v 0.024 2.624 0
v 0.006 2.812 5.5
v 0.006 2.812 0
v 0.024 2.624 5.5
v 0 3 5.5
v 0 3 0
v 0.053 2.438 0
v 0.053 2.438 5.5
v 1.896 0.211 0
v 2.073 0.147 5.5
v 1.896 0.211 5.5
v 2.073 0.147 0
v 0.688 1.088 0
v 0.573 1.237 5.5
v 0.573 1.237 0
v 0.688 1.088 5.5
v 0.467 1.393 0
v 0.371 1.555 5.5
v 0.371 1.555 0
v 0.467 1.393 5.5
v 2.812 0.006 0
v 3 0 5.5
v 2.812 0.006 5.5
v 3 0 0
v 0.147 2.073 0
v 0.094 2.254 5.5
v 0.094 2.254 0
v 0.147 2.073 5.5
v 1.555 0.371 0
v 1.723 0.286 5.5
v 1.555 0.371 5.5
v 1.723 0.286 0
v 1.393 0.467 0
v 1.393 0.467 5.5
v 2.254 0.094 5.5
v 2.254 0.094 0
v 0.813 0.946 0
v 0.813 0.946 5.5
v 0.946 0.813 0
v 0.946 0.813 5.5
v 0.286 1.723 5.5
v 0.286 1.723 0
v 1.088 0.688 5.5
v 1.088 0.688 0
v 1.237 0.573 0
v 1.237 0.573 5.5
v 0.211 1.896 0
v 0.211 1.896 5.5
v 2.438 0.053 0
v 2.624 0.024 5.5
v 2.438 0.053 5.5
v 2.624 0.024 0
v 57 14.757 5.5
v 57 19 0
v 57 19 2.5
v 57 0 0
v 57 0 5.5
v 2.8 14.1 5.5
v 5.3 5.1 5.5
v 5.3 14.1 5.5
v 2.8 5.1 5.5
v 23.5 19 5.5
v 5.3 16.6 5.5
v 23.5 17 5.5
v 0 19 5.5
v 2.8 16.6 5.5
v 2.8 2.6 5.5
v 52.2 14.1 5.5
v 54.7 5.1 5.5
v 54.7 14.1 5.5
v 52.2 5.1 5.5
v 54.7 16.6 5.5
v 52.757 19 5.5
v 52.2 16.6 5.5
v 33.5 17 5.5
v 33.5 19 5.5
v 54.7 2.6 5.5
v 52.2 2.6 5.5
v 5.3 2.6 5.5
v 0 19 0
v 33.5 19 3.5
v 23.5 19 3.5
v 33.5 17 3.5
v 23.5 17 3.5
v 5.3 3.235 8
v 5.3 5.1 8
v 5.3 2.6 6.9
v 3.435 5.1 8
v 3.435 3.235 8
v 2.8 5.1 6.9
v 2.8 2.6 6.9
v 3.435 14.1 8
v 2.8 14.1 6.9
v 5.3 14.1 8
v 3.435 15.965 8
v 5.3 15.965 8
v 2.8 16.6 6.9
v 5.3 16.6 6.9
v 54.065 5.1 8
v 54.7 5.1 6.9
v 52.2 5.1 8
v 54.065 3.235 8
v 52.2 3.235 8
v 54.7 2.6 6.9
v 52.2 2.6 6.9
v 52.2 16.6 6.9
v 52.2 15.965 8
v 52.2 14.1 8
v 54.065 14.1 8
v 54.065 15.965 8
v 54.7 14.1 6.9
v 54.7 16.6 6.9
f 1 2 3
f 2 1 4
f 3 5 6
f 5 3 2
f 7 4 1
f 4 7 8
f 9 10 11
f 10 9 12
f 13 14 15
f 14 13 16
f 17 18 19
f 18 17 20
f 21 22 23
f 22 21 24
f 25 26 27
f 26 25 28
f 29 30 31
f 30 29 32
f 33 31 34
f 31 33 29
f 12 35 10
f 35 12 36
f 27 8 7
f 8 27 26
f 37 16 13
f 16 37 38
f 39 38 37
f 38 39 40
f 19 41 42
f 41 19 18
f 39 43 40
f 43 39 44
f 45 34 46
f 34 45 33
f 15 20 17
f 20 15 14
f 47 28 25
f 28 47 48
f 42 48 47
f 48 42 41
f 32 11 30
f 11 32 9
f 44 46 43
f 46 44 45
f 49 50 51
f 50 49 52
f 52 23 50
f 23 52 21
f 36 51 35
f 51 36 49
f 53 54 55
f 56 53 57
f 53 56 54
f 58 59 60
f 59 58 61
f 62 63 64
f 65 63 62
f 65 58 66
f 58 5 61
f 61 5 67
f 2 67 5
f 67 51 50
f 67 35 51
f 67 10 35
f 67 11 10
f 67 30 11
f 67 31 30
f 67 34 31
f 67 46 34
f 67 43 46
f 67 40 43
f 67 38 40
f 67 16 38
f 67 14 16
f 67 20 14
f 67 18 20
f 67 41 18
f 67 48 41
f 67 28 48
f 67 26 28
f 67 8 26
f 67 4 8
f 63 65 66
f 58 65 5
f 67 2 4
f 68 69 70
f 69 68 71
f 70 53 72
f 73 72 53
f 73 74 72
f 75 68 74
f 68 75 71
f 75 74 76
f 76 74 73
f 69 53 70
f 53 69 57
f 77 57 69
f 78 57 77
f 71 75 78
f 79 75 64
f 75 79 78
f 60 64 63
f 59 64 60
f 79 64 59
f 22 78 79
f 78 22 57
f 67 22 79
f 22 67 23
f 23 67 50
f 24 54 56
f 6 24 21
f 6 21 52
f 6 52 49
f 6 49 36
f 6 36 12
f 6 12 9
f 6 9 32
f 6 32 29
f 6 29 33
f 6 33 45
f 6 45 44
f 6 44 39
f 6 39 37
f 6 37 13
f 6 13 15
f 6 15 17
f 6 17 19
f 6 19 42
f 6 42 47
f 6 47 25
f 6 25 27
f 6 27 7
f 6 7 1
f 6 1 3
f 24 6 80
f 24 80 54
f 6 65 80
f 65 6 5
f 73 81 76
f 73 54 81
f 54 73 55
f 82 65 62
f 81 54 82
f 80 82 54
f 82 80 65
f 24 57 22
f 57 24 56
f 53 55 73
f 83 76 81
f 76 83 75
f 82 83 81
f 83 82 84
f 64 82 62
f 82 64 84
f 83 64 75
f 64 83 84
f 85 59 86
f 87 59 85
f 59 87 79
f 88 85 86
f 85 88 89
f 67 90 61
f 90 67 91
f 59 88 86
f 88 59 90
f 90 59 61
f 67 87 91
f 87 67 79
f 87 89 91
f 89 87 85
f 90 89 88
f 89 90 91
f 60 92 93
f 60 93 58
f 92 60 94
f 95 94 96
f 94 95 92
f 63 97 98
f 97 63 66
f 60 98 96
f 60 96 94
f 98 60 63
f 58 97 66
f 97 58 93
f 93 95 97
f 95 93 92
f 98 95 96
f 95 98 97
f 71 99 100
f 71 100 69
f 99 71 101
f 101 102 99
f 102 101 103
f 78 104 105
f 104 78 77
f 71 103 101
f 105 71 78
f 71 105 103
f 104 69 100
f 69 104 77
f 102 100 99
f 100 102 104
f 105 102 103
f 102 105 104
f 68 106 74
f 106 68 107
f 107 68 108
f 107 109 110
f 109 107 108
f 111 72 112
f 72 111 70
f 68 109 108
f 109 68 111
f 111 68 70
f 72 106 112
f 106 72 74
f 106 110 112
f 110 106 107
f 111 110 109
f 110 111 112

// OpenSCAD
length=57;
height=19;
corner_radius=3;
thickness=2+3.5;
plate_thickness=1.4;
clip_radius=0.4;
clip_length=14;

corner_trim=6;

// 7.3-4.1 = 3.2 (L/R)
// 7-4.1 = 2.9 (B)
// Clip bounds: 51.9

left_offset=2.8;
bottom_offset=2.6;
space_between_clips=51.9;

module pin() {
    size=2.5;
    difference() {
        cube([size, size, size]);
        translate([0, 0, plate_thickness]) rotate([60, 0, 0]) cube([size, size, size]);
        translate([0, 0, plate_thickness]) rotate([0, -60, 0]) cube([size, size, size]);
    }
}

union() {
    difference() {
        cube([length, height, thickness]);
        translate([corner_radius, corner_radius, 0]) rotate([0, 0, 180]) difference() {
            translate([0, 0, -1]) cube([corner_radius+1, corner_radius+1, thickness+2]);
            translate([0, 0, -2]) cylinder(r=corner_radius, h=thickness+4, $fn=100);
        }
        // A small cutout for the plate bolt
        translate([length, height, thickness]) rotate([180, 0, 45]) translate([-corner_trim/2, -corner_trim/2, 0]) rotate([0, -45, 0]) translate([0, 0, -corner_trim]) cube(corner_trim);
        // A small grove to remove it using a screwdriver
        translate([(length-10)/2, height-2, thickness-2]) cube([10, 10, 10]);
    }

    translate([left_offset, bottom_offset, thickness]) pin();
    translate([left_offset, bottom_offset+clip_length, thickness]) rotate([0, 0, -90]) pin();
    translate([left_offset+space_between_clips, bottom_offset, thickness]) rotate([0, 0, 90]) pin();
    translate([left_offset+space_between_clips, bottom_offset+clip_length, thickness]) rotate([0, 0, 180]) pin();
}
